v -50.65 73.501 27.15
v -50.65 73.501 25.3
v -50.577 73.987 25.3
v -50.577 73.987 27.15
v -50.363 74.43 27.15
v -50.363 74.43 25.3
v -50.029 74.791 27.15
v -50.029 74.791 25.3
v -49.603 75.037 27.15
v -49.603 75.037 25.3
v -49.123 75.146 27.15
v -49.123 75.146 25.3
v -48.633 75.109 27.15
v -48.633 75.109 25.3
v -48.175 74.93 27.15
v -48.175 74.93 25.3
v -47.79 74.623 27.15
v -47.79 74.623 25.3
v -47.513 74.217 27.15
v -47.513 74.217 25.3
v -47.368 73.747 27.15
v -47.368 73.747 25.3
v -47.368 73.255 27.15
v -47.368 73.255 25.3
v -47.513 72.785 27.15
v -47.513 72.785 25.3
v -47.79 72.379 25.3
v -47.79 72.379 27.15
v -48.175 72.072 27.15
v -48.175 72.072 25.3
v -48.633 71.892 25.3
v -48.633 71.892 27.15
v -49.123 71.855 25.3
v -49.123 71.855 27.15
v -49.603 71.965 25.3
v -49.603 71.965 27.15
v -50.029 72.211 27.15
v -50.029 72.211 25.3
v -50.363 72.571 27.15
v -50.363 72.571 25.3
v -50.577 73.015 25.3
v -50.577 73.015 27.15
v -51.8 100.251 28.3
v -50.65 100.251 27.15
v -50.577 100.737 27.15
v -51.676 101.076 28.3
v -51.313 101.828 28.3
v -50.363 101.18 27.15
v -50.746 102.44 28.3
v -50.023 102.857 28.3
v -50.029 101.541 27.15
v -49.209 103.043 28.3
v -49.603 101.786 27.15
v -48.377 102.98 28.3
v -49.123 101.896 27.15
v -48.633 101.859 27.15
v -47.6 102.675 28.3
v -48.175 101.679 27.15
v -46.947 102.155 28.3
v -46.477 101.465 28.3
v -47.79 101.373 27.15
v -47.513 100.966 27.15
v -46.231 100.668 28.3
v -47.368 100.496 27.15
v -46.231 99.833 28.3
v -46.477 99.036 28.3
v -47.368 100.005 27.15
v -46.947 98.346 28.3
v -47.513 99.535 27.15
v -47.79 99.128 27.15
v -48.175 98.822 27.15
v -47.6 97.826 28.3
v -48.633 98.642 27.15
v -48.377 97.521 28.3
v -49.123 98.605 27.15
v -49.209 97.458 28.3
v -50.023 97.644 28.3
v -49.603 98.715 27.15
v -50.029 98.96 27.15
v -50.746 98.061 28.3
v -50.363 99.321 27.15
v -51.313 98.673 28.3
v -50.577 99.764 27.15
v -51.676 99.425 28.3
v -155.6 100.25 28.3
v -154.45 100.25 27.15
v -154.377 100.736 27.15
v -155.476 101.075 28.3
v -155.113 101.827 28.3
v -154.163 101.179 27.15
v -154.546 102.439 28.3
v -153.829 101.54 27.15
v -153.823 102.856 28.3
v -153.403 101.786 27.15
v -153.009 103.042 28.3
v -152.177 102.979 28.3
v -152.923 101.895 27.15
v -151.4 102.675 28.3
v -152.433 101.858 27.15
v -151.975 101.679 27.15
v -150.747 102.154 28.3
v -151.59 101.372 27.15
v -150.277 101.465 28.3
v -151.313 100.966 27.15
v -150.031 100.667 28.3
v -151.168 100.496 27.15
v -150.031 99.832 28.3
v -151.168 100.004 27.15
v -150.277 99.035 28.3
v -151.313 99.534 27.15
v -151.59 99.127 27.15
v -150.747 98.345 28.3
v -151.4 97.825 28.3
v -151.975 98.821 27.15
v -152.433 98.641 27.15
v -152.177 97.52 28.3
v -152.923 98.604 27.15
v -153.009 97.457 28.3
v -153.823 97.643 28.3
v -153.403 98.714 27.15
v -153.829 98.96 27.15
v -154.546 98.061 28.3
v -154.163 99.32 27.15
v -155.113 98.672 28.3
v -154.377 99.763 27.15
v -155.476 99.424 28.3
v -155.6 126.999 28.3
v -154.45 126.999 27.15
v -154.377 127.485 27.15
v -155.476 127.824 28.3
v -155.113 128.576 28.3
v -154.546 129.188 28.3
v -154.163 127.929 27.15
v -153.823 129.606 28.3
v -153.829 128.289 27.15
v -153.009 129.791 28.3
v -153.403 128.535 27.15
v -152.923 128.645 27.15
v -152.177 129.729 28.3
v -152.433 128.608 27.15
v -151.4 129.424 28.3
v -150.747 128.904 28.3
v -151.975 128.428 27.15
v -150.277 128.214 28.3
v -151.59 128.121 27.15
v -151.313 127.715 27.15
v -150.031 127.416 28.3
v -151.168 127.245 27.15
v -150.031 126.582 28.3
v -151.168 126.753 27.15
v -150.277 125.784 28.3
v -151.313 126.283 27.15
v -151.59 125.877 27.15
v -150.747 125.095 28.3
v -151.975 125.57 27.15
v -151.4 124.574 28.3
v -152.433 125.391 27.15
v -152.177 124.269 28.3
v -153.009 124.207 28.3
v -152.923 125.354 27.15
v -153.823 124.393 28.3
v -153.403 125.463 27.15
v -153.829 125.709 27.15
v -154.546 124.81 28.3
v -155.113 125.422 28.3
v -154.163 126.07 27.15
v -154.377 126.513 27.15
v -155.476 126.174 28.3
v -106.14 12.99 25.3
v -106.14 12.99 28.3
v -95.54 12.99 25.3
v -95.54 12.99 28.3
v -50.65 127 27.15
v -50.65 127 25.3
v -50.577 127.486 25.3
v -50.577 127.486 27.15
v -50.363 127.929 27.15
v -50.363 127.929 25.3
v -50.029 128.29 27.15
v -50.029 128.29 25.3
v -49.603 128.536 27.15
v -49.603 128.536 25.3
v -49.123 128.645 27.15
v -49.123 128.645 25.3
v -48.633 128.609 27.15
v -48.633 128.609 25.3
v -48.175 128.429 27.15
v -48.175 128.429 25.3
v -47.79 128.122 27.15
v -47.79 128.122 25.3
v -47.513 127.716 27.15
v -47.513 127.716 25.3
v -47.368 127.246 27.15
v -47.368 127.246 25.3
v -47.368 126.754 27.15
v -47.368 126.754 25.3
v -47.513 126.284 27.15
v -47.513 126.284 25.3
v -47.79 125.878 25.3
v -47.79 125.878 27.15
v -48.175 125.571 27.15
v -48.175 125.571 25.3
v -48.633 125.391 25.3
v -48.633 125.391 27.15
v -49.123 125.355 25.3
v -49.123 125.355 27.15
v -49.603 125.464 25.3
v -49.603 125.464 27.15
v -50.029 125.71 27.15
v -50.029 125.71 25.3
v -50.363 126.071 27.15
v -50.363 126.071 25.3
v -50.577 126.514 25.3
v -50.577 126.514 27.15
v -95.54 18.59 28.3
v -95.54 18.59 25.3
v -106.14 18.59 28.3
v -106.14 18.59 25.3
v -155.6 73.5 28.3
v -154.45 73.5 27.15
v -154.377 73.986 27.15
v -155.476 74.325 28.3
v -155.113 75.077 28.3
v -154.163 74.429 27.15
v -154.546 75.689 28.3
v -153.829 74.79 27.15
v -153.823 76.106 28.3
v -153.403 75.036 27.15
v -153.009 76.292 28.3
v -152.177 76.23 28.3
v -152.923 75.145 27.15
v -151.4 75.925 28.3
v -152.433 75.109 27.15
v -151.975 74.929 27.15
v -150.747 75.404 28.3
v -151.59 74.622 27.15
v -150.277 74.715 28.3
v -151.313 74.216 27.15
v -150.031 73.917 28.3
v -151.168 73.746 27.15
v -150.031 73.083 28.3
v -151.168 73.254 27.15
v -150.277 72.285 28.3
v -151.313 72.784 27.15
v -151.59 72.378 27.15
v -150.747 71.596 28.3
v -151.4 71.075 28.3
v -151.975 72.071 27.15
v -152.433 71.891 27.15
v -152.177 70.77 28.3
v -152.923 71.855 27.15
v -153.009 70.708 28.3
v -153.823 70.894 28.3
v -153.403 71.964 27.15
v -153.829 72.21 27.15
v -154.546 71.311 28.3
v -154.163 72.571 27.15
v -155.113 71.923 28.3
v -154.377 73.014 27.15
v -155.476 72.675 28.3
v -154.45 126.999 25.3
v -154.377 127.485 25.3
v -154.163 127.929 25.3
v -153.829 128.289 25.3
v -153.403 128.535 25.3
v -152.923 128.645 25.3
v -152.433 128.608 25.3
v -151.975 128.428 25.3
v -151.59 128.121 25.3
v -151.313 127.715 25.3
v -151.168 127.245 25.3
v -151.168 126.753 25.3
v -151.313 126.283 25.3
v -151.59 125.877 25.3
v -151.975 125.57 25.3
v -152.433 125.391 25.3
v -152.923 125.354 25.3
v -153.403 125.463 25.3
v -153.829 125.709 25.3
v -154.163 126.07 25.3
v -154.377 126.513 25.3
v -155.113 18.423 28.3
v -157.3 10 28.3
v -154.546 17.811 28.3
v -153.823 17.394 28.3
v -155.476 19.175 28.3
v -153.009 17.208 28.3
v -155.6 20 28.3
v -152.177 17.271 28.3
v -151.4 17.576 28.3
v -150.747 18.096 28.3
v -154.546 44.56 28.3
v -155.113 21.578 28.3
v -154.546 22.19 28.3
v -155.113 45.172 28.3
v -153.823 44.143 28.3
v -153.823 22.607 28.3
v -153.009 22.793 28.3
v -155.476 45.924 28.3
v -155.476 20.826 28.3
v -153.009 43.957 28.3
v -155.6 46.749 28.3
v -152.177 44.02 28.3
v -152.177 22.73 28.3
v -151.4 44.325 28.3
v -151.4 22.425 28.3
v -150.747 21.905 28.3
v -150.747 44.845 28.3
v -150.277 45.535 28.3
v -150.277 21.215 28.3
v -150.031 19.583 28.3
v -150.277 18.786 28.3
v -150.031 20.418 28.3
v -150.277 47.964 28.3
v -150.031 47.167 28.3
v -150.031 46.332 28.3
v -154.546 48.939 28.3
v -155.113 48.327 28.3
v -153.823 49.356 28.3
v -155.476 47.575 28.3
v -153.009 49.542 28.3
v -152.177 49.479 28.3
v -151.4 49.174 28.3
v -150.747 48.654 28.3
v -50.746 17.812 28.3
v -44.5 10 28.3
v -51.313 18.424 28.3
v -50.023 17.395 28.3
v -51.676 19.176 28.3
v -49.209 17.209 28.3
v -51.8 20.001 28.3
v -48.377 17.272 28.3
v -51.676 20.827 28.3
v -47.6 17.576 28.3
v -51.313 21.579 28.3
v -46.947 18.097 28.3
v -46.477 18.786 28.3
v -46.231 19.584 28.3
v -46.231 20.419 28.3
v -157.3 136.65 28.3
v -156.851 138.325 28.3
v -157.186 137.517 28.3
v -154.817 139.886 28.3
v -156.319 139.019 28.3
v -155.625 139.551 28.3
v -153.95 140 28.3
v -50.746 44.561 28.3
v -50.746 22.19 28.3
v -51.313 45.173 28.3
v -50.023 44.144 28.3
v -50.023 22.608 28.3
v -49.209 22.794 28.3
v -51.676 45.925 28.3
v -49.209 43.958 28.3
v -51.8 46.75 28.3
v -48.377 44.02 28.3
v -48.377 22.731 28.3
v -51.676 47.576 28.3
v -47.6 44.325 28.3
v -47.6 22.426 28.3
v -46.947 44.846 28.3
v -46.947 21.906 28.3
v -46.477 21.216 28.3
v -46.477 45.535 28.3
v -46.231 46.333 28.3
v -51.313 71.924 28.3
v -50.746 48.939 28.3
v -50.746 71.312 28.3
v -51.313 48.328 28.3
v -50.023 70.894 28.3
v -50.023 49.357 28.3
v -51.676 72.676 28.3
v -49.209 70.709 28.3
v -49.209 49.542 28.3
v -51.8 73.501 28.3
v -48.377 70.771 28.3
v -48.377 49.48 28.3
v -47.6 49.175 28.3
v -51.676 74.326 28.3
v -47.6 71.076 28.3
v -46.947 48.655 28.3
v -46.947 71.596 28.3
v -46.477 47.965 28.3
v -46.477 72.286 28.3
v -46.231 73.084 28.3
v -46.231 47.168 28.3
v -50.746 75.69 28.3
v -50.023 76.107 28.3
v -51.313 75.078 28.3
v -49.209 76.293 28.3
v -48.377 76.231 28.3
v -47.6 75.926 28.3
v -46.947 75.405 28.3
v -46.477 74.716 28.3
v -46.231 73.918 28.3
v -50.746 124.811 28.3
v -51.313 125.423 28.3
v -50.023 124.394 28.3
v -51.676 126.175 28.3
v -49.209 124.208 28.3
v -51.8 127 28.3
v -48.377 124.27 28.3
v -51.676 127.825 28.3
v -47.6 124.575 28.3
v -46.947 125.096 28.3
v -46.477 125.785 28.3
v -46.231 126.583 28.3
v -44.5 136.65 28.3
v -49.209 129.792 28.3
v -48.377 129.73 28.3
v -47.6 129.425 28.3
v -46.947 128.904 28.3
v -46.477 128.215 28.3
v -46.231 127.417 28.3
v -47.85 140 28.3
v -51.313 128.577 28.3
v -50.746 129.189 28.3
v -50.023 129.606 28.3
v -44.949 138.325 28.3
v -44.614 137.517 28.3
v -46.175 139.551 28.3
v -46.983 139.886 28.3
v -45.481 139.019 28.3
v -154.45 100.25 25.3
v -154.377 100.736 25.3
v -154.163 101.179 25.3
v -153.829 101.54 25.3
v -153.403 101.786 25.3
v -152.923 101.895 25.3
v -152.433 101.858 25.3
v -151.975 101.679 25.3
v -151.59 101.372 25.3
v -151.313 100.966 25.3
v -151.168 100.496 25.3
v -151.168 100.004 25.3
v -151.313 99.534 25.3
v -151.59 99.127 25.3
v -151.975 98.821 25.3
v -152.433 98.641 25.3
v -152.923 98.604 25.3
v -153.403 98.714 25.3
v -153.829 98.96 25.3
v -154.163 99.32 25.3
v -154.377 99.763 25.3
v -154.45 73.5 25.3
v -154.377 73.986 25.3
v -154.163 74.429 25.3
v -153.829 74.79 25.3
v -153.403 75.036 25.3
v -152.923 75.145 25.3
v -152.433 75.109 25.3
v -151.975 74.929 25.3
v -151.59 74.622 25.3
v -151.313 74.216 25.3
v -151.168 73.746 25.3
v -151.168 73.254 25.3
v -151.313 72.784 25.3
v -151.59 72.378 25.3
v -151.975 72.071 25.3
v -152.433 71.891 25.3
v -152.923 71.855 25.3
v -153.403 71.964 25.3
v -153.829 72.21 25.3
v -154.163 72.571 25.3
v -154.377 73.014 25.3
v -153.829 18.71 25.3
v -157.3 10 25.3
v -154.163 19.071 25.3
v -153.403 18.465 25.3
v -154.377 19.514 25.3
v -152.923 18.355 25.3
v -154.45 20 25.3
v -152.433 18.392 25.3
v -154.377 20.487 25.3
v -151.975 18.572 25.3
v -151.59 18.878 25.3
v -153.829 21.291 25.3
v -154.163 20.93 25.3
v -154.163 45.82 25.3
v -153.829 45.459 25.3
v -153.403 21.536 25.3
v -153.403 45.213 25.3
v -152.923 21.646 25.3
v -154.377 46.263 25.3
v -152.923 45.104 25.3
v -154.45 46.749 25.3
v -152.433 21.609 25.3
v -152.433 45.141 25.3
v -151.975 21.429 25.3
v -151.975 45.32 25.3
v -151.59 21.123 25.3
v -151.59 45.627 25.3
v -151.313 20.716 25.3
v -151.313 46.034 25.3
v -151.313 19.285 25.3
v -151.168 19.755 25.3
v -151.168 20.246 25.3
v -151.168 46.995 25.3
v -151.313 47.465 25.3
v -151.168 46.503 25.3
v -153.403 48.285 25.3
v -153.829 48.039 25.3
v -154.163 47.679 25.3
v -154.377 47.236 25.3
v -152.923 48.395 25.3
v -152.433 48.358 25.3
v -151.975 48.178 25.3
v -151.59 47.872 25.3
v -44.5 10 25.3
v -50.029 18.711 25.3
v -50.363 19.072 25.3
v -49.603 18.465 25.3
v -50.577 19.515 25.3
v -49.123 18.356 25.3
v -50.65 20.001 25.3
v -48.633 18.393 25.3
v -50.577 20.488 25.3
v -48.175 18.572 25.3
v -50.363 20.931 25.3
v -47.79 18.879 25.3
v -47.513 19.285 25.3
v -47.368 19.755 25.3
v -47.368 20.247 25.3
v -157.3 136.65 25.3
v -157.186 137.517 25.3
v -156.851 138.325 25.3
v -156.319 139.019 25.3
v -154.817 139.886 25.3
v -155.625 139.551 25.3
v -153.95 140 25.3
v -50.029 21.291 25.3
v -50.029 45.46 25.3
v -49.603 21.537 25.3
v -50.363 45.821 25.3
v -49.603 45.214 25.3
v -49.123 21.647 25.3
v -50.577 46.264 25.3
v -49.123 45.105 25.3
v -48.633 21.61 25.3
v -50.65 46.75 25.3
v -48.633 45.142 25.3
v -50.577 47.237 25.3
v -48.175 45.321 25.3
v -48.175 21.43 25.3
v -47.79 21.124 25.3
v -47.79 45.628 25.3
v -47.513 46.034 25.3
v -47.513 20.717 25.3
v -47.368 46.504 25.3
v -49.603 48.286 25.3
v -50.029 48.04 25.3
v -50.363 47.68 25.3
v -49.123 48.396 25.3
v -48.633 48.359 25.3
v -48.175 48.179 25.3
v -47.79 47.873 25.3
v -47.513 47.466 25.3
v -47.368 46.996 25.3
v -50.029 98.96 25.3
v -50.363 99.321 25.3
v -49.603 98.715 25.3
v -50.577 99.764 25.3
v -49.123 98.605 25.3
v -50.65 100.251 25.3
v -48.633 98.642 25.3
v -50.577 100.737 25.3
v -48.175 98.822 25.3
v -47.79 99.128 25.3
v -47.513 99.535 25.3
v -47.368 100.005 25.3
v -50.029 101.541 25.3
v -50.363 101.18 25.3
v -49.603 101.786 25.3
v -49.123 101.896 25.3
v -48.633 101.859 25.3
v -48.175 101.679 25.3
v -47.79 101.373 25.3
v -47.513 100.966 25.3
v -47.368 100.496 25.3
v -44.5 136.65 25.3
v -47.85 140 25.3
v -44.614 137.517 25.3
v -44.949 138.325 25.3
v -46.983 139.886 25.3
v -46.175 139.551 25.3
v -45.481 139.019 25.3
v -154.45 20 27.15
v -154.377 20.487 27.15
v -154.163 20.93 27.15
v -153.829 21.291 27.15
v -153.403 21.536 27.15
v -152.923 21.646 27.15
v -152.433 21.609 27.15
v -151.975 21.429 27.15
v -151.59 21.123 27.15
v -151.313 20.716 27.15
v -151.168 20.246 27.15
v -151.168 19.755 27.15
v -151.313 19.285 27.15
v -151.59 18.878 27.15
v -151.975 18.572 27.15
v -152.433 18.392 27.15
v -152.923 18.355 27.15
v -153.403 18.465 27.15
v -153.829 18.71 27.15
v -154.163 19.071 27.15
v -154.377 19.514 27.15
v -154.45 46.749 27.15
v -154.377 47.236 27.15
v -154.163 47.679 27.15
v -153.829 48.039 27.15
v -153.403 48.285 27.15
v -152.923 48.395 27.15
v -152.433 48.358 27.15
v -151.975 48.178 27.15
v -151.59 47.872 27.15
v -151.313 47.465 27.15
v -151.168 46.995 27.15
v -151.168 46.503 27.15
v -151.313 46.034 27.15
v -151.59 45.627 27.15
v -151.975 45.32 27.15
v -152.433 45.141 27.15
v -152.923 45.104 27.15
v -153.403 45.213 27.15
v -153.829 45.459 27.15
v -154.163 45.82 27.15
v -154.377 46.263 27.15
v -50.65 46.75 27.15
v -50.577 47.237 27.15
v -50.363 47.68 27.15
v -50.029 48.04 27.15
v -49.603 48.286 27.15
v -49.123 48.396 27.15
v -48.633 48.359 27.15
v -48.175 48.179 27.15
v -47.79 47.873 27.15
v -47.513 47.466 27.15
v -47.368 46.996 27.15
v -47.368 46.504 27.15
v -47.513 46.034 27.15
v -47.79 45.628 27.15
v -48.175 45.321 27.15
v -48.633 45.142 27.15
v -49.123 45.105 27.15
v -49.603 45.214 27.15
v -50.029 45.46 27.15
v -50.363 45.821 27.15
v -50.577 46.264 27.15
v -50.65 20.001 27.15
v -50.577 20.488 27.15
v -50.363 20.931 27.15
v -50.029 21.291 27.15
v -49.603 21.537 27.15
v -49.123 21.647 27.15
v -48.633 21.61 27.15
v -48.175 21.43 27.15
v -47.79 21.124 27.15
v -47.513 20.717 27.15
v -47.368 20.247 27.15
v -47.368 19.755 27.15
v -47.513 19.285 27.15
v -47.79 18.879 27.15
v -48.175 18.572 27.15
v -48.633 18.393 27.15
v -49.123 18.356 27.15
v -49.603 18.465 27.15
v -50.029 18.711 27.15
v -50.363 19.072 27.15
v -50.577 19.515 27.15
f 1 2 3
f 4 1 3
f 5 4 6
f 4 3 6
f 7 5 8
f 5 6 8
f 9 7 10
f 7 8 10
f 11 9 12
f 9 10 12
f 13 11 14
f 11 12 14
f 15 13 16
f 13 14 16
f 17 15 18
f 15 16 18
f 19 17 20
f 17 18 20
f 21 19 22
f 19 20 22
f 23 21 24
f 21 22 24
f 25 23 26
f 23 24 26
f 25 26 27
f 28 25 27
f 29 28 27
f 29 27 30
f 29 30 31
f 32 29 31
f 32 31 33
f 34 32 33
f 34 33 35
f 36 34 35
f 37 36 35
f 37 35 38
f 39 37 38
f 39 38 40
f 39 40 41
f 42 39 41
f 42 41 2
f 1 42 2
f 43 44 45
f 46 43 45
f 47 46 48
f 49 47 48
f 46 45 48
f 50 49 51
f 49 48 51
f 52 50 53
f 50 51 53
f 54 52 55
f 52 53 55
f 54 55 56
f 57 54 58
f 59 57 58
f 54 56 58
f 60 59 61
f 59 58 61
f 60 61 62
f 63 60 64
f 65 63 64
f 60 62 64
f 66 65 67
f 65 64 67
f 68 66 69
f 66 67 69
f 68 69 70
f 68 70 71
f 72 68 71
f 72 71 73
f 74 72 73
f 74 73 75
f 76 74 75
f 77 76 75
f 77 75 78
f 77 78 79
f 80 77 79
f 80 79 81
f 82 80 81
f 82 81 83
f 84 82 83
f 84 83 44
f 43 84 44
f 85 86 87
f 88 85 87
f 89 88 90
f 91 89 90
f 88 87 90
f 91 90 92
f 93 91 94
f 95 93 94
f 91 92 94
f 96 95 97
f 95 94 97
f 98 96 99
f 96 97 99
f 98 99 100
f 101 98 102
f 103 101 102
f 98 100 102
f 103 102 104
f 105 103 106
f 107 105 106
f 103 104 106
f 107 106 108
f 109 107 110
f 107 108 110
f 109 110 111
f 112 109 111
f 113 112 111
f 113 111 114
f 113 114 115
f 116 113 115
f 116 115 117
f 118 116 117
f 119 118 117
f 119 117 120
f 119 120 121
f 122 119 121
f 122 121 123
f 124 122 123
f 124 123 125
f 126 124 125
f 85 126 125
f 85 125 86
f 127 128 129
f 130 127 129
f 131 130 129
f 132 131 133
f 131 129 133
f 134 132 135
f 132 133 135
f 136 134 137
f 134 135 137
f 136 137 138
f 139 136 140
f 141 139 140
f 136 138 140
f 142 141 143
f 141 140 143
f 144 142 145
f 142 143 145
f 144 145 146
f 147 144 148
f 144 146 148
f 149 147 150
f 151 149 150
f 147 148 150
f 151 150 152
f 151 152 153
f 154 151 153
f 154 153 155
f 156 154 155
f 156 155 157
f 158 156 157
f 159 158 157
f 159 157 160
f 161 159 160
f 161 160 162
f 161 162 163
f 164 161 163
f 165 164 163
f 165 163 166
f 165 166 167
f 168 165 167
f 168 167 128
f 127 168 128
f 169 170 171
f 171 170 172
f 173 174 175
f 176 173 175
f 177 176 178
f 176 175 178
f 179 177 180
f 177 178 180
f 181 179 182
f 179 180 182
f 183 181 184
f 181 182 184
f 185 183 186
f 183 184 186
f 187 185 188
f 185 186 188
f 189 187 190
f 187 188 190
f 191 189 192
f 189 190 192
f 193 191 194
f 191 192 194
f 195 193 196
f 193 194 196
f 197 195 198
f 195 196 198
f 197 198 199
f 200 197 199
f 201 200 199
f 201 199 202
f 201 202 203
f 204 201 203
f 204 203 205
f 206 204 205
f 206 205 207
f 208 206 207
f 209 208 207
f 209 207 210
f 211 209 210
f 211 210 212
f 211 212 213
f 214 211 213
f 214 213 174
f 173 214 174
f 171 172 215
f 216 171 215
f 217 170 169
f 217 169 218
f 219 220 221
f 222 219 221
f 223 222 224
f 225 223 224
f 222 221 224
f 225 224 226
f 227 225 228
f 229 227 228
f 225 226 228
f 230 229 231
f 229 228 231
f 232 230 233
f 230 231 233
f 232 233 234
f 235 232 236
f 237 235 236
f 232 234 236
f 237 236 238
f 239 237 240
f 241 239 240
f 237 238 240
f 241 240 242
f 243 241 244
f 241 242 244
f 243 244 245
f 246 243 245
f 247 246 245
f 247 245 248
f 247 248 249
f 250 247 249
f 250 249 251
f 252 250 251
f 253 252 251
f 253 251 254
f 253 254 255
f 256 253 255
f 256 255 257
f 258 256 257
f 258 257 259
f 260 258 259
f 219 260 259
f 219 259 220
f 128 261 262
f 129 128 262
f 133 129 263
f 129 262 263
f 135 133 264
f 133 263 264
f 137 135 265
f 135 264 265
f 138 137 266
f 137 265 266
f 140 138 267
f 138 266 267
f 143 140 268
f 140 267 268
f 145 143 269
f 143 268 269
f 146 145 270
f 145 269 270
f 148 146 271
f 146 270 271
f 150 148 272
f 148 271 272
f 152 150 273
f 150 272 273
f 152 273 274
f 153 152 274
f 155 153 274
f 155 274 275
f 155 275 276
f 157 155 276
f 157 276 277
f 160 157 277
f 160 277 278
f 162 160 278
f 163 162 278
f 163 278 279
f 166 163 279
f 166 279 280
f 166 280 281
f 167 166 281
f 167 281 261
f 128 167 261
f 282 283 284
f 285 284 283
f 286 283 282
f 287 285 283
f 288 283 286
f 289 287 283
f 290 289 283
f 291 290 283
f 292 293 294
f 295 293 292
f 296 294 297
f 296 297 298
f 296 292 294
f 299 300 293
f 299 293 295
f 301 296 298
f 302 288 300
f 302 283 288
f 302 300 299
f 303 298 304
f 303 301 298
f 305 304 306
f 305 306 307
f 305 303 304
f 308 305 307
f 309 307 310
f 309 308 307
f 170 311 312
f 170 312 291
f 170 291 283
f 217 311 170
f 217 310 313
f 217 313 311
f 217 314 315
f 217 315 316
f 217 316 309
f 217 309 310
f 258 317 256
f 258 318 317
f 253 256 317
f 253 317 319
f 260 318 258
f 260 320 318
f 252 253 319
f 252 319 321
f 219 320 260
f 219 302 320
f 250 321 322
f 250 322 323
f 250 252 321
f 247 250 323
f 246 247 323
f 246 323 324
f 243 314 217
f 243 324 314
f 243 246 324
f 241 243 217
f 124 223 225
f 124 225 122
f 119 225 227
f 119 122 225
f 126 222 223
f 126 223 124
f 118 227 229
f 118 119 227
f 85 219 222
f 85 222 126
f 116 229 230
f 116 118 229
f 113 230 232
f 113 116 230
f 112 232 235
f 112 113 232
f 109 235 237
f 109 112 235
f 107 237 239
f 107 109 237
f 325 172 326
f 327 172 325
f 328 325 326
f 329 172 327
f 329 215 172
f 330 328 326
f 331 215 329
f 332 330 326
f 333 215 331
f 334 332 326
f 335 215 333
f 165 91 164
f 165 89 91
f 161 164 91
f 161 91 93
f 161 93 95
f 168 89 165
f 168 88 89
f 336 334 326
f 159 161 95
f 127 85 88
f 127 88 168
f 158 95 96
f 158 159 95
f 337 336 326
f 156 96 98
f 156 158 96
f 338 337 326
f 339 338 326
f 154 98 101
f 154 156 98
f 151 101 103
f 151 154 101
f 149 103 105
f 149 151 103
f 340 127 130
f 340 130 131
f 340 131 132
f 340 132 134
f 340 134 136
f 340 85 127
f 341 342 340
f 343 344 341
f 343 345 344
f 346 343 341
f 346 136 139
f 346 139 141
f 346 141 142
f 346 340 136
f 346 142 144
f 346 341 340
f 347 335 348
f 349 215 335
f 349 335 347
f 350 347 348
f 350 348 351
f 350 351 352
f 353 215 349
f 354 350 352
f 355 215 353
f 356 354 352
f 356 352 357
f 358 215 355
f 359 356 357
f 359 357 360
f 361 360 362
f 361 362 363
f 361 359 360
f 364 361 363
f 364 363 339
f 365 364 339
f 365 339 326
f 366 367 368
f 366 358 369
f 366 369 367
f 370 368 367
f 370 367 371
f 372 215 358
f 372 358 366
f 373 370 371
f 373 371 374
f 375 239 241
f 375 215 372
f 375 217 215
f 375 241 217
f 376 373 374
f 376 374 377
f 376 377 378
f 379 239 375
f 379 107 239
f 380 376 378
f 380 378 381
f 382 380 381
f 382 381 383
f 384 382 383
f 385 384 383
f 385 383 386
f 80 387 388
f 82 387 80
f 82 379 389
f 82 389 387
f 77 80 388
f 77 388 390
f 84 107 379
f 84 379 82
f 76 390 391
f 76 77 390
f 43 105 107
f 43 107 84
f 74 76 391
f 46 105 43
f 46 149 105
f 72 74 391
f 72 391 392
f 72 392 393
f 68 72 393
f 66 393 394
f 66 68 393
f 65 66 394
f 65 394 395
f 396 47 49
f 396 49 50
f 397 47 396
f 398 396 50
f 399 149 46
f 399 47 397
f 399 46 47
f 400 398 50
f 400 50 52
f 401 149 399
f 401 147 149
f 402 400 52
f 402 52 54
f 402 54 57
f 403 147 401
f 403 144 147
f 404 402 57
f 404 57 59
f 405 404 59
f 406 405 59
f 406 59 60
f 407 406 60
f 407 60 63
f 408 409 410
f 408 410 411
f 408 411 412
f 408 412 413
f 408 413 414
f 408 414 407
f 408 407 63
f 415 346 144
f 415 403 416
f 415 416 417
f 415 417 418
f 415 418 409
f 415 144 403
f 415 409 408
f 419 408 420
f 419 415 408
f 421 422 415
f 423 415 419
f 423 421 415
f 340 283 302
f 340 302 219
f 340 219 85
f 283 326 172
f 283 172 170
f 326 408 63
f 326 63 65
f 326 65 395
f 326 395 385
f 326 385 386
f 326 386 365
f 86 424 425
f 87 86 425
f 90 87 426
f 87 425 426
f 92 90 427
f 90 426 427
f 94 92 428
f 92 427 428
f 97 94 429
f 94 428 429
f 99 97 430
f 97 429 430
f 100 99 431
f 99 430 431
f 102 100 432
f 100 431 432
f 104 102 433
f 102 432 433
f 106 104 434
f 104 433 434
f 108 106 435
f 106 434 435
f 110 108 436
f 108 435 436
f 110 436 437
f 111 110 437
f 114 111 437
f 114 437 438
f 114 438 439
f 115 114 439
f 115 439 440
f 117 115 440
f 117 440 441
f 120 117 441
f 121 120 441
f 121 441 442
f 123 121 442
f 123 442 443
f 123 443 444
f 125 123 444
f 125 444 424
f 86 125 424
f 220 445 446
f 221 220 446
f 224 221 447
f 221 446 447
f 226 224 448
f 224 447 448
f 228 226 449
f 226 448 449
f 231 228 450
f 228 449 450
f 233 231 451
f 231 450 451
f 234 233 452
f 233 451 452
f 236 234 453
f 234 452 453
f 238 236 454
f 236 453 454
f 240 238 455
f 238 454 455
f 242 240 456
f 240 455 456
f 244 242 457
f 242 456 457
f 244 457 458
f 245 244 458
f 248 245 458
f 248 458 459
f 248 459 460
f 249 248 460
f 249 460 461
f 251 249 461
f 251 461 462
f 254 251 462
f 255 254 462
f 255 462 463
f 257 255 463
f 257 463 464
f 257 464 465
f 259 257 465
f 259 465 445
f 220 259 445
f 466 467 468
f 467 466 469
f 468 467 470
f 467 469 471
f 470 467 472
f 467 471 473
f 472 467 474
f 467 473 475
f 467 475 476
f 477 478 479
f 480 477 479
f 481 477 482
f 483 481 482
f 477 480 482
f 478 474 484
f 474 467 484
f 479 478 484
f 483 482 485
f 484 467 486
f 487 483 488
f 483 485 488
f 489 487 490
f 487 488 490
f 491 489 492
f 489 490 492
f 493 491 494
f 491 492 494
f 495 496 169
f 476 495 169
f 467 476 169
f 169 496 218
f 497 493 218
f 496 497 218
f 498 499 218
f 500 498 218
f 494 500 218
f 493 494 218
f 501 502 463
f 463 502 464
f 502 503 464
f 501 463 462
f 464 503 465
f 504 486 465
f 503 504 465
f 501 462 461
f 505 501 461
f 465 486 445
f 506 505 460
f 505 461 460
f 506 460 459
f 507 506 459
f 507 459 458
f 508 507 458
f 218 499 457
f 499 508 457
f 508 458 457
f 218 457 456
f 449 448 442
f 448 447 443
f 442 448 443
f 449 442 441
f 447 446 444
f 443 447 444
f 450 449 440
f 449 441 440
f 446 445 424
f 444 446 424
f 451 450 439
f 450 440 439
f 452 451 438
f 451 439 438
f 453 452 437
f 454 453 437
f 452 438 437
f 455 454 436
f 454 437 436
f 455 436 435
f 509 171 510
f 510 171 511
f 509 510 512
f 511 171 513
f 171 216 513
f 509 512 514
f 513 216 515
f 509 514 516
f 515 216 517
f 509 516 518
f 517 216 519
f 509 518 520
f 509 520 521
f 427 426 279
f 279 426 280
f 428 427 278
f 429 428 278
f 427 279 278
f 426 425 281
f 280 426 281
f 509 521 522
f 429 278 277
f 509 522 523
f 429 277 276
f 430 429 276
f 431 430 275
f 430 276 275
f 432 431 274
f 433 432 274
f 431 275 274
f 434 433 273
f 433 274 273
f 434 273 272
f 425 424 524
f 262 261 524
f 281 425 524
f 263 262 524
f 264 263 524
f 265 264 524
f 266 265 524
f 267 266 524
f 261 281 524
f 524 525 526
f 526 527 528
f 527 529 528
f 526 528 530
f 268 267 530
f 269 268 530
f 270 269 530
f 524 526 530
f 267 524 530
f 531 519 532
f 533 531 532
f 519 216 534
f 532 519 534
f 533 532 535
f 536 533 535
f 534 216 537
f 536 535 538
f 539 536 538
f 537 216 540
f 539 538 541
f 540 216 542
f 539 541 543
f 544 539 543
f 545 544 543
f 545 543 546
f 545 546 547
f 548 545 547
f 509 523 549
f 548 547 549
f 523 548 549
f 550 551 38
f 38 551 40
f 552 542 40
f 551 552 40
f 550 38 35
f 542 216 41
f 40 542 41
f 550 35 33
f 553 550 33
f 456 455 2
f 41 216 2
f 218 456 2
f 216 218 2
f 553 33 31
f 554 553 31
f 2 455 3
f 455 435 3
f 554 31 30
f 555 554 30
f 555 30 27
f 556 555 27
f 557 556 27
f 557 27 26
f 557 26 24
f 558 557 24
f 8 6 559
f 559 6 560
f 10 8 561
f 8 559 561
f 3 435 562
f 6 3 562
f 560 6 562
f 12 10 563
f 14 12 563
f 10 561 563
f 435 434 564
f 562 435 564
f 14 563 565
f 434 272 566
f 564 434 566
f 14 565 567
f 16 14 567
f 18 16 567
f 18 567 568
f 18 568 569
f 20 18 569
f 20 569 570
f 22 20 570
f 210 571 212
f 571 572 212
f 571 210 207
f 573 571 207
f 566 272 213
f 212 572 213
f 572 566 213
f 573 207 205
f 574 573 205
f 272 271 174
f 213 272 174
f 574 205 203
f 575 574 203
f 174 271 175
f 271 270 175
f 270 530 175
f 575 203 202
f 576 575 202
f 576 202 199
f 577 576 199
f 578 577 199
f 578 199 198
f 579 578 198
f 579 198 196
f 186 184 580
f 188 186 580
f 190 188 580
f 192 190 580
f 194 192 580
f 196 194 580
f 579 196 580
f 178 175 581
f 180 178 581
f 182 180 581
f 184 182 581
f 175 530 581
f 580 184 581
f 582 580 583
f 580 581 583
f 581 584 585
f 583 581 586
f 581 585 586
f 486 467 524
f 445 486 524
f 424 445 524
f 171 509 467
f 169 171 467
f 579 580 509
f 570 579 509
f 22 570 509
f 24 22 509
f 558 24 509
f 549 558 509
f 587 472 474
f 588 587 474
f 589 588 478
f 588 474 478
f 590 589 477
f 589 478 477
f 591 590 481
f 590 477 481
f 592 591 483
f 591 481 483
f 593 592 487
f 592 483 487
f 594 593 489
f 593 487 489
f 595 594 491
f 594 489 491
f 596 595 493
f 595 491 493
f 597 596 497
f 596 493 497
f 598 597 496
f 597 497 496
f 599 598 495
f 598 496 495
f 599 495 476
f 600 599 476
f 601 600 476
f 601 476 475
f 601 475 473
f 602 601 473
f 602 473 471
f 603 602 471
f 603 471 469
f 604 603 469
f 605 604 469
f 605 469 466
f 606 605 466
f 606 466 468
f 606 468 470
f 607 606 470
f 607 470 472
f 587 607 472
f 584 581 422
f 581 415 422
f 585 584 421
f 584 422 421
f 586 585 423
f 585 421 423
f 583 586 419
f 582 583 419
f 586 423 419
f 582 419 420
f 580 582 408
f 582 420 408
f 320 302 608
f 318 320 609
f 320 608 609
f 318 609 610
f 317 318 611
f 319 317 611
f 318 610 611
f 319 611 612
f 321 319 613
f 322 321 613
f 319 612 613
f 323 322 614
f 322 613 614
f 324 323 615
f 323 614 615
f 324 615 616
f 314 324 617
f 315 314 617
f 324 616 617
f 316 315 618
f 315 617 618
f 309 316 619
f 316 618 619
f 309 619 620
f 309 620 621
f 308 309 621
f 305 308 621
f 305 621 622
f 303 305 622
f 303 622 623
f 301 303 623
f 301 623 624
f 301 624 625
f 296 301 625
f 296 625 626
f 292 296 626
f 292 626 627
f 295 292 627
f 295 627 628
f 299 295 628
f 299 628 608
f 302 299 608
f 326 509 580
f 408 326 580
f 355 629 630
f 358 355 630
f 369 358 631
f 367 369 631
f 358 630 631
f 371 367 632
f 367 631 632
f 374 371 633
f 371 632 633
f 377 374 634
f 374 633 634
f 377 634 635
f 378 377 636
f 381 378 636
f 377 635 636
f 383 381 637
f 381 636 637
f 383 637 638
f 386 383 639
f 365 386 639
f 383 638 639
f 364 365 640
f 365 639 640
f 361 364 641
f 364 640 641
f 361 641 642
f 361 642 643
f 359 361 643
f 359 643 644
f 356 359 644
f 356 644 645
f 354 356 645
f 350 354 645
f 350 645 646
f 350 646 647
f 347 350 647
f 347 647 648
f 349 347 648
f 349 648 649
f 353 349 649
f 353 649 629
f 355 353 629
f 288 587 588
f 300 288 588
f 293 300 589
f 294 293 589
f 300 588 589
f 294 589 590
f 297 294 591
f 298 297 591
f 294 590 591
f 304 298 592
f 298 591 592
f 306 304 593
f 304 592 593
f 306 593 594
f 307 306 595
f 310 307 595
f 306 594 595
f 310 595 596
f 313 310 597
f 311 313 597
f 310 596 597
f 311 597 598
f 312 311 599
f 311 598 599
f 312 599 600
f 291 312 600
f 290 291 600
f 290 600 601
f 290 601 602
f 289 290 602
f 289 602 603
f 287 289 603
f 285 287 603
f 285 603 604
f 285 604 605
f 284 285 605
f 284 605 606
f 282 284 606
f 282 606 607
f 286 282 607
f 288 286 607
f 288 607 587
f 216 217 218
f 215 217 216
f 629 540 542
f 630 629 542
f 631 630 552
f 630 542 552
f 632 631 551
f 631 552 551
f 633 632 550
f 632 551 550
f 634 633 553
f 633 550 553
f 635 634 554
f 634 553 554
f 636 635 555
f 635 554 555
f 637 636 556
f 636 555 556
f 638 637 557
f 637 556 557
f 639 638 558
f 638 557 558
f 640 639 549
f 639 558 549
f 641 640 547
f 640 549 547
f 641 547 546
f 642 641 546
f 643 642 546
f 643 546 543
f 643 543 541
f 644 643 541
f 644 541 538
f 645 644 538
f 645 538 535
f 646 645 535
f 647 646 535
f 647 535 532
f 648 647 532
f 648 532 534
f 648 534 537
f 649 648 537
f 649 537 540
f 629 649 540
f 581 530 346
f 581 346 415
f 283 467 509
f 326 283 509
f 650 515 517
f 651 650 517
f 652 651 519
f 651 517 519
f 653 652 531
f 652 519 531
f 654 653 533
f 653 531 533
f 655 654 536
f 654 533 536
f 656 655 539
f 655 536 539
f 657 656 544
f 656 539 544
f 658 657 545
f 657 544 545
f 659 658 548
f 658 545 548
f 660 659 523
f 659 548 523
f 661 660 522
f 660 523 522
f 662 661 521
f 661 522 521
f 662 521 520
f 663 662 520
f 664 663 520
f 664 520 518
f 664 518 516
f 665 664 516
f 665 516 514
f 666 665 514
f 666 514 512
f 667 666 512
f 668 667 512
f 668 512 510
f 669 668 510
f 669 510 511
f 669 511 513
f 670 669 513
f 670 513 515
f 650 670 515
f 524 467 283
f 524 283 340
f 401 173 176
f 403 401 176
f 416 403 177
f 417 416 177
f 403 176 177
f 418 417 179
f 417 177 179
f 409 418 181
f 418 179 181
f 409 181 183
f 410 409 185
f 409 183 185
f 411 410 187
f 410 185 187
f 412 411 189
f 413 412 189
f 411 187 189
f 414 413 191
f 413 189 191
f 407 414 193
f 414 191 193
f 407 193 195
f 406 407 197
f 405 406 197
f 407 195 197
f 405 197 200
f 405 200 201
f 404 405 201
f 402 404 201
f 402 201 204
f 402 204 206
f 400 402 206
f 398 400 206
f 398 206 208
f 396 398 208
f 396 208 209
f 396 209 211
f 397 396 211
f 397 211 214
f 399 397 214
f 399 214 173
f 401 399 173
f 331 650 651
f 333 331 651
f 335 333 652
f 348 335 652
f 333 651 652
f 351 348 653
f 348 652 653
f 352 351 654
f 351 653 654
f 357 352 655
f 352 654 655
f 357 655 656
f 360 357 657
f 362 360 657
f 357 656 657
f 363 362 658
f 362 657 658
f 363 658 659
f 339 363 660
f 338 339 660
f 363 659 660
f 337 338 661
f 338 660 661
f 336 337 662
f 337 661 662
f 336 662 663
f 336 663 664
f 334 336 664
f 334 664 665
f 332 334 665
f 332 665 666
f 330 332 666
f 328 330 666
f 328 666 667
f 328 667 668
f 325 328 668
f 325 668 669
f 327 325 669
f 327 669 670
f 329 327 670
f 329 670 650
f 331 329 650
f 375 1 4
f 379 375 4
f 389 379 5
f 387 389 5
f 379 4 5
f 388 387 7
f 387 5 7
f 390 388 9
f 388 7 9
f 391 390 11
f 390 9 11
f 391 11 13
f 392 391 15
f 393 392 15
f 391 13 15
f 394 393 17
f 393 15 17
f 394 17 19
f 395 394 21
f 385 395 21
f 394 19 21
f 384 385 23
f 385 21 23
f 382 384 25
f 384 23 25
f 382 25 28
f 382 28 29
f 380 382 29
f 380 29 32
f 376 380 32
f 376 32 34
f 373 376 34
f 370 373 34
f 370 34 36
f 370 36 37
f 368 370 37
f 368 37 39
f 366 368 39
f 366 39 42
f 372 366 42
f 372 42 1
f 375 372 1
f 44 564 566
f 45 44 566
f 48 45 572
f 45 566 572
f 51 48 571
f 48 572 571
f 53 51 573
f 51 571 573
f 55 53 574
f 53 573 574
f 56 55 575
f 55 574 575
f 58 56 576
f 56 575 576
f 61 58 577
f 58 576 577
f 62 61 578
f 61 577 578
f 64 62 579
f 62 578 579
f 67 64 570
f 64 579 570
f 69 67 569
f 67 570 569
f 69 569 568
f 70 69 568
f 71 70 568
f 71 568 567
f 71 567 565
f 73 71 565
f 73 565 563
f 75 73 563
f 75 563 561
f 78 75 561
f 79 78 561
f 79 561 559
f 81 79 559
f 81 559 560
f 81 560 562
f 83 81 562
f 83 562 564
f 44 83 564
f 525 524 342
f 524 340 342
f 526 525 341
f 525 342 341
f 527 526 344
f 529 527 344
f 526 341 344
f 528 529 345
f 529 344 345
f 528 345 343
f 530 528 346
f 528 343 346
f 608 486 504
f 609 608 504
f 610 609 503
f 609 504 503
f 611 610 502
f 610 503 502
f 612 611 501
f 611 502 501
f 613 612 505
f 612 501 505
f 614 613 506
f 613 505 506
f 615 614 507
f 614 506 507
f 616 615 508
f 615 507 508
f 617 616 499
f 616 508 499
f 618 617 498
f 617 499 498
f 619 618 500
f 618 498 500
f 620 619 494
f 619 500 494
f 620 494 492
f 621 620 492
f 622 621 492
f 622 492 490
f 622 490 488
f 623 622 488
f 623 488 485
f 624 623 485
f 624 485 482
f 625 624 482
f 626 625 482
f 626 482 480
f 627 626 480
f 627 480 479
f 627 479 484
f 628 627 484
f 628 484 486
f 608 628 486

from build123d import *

# Parameters (mm, degrees)
SKETCH068_W         = 112.8
SKETCH068_H         = 130
PAD003_DEPTH        = 3
HOLE015_D           = 3.3
HOLE015_DEPTH       = 3
HOLE015_CSINK_D     = 5.6
HOLE015_CSINK_ANGLE = 90
SKETCH073_W         = 10.6
SKETCH073_H         = 5.6
POCKET016_DEPTH     = 5
FILLET001_R         = 3.35


with BuildPart() as part:
    # Sketch068 → Pad003 (new body)
    with BuildSketch(Plane.XY):
        with Locations((-100.900002, 75)):
            Rectangle(SKETCH068_W, SKETCH068_H)
    extrude(amount=PAD003_DEPTH)

    # Hole015
    with Locations(Plane.XY.offset(3)):
        with Locations((-152.800002, 20.000492), (-152.800002, 46.749416), (-152.800002, 73.500001), (-152.800002, 100.249657), (-152.800002, 126.999153), (-49.000002, 20.001339), (-49.000002, 46.750263), (-49.000002, 73.500848), (-49.000002, 100.250504), (-49.000002, 127)):
            CounterSinkHole(HOLE015_D / 2, HOLE015_CSINK_D / 2, depth=HOLE015_DEPTH, counter_sink_angle=HOLE015_CSINK_ANGLE)

    # Sketch073 (on Face5 of Hole015) → Pocket016 (cut)
    with BuildSketch(Plane.XY.offset(3)):
        with Locations((-100.839996, 15.79)):
            Rectangle(SKETCH073_W, SKETCH073_H)
    extrude(amount=-POCKET016_DEPTH, mode=Mode.SUBTRACT)

    # Fillet001
    fillet001_edges = [part.edges().sort_by_distance(p)[0] for p in [
        (-44.500002, 140, 1.5),
        (-157.300002, 140, 1.5),
    ]]
    fillet(fillet001_edges, radius=FILLET001_R)


with BuildPart() as part_1:
    # Body009 placement: moved
    add(part.part.moved(Location((0, 0, 25.3))))


solid = part_1.part
